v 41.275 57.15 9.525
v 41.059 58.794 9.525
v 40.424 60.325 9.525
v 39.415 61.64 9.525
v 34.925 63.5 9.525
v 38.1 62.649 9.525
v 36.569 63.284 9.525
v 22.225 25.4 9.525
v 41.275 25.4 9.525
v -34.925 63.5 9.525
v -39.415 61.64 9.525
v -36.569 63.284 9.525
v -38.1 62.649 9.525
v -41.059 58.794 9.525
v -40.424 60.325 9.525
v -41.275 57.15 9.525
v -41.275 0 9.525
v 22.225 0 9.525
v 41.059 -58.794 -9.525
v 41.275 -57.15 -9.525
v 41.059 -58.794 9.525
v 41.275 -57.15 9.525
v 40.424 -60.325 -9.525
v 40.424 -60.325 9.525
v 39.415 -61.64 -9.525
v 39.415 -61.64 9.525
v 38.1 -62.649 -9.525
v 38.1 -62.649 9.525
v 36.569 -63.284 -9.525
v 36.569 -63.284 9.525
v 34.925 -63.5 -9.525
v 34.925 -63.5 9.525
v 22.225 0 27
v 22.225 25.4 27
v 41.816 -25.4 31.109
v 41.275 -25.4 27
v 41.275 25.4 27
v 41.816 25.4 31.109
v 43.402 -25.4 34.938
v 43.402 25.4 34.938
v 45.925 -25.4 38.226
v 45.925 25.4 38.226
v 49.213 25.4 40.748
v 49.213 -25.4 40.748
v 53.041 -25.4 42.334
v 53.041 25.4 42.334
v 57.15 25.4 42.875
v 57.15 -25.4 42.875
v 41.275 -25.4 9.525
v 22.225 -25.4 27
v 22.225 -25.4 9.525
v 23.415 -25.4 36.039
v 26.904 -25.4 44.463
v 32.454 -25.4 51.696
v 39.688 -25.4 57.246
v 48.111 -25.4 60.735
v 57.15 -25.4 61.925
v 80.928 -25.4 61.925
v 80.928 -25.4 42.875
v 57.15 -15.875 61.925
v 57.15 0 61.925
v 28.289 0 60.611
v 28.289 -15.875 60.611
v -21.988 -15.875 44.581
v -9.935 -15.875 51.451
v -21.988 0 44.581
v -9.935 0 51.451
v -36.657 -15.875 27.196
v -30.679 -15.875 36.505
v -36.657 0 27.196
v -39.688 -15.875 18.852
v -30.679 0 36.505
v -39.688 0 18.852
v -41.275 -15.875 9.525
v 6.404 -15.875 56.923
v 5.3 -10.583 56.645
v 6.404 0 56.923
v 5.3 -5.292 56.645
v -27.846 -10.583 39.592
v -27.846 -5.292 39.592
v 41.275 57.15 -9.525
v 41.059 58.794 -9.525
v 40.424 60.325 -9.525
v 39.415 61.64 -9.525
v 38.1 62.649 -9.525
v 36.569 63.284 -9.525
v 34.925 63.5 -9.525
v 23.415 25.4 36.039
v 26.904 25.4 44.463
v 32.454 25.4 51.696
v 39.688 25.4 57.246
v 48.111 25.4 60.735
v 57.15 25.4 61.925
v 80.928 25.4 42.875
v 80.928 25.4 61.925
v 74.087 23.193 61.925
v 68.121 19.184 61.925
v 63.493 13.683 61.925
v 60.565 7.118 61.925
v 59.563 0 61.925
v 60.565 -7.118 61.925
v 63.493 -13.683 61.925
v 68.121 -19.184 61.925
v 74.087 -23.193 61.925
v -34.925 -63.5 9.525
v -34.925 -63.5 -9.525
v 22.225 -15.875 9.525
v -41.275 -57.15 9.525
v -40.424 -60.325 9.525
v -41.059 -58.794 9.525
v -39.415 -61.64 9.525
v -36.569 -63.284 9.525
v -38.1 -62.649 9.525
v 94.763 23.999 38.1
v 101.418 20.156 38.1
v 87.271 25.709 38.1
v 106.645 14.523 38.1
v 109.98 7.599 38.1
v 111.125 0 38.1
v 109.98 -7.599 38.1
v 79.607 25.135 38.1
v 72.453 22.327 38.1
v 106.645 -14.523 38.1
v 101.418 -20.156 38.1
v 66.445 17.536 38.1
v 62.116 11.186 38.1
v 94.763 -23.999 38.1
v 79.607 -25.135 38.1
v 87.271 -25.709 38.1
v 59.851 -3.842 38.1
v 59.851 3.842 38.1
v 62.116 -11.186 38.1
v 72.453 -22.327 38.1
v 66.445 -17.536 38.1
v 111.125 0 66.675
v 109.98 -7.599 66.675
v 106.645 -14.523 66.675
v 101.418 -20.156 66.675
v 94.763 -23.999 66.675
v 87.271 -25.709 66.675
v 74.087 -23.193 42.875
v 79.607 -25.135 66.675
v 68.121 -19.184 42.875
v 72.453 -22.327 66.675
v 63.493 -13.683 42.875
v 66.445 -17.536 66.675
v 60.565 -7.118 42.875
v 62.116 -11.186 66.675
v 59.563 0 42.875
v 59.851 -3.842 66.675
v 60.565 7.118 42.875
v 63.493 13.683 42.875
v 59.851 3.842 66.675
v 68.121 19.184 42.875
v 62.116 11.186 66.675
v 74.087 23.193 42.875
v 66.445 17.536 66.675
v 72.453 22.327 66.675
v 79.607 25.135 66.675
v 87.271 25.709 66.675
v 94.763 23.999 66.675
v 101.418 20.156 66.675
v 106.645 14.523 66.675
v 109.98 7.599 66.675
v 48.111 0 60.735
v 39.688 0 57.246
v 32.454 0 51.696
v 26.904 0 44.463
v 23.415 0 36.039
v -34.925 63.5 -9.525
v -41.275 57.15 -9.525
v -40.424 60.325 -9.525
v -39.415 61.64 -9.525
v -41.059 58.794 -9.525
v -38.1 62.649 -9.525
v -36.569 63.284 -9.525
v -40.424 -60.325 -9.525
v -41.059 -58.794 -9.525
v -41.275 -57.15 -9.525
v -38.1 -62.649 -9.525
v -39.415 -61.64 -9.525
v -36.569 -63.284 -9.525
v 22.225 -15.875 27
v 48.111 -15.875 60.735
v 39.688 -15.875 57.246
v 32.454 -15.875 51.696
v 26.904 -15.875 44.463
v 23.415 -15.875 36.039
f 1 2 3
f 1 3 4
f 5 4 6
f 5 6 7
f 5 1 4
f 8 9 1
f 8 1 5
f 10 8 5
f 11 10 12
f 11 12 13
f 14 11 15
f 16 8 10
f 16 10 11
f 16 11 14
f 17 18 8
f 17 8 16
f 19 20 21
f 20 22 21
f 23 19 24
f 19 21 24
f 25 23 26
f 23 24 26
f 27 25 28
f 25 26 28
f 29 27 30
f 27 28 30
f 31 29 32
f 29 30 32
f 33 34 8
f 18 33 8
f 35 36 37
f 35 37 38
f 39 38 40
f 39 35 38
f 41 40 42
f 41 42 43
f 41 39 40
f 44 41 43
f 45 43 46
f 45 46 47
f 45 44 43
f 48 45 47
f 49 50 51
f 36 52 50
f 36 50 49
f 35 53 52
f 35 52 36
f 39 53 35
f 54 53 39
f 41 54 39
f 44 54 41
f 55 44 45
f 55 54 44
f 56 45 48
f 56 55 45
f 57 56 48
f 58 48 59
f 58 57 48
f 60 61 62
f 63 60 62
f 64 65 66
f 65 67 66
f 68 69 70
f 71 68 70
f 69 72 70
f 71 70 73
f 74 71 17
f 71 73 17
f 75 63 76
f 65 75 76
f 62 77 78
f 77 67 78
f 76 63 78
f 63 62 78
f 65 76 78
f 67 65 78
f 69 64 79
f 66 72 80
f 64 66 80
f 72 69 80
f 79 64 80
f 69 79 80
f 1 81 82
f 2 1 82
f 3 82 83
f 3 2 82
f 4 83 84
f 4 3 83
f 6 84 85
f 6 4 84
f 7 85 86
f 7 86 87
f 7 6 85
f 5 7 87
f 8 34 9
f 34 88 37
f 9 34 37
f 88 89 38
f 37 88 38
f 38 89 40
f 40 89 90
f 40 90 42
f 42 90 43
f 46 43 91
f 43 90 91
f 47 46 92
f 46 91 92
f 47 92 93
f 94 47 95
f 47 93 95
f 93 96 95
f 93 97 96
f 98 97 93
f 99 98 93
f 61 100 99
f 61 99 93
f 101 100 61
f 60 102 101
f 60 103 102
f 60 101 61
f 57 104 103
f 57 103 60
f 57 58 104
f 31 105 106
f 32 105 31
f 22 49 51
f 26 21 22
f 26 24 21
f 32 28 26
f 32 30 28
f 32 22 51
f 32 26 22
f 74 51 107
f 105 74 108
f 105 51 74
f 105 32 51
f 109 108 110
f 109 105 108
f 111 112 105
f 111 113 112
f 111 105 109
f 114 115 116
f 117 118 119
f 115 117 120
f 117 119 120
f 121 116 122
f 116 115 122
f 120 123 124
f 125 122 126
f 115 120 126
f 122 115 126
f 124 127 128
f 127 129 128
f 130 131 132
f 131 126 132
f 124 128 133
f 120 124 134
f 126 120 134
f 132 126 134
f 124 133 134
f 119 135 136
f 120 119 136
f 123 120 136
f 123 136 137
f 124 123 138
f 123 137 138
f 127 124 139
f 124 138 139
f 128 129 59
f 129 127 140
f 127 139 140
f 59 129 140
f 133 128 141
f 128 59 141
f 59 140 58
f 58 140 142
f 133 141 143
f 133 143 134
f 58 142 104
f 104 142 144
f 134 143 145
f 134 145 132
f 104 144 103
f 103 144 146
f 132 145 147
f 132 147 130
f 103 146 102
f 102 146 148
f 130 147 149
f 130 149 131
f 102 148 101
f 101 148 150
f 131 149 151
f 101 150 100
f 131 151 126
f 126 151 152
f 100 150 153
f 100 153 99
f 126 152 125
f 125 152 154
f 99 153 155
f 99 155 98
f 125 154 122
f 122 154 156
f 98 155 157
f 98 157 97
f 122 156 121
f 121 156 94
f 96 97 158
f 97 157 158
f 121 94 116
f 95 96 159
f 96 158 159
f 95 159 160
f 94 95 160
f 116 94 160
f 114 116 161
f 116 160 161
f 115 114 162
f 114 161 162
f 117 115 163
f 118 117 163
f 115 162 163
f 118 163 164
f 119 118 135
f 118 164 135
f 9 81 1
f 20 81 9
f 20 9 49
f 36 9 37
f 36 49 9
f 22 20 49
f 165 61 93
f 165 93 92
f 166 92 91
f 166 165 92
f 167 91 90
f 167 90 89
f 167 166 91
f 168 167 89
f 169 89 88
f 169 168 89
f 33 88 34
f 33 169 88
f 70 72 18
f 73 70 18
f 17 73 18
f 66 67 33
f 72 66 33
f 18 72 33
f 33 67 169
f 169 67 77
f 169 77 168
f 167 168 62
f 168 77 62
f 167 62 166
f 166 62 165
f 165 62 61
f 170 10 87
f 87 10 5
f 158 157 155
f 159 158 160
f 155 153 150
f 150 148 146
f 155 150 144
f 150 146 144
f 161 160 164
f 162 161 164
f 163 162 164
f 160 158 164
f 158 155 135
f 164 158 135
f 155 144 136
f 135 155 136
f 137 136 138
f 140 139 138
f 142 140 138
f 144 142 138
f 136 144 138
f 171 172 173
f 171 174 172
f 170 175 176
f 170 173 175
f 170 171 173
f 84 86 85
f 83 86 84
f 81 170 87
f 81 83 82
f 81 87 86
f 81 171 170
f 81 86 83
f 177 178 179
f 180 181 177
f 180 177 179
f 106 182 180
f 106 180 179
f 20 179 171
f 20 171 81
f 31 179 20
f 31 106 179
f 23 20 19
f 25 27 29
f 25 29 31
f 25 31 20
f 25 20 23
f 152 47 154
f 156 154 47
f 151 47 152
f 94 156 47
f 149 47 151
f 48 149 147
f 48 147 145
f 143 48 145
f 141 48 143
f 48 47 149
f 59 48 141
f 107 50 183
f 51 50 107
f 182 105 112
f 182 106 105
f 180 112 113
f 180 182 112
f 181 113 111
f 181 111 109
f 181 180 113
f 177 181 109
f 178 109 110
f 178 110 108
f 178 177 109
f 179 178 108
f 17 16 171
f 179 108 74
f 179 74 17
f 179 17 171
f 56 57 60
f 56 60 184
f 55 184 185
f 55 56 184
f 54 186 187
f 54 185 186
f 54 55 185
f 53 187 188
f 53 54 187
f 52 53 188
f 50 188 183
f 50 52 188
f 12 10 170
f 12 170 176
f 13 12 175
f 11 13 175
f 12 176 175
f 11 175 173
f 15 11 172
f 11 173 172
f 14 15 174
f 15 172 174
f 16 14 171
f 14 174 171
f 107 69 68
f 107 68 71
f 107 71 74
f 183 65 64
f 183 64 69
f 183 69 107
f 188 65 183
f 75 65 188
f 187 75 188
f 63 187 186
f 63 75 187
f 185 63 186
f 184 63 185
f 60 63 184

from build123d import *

# Parameters (mm, degrees)
F1_DEPTH = 63.5
F0_W     = 25.0189637039
F0_H     = 19.05
F2_DEPTH = 25.4
F3_DEPTH = 15.875
F5_R     = 6.35


with BuildPart() as f1:
    # F0 (on Front) → F1 (new body, symmetric)
    with BuildSketch(Plane.XZ):
        Polygon((22.225, 9.525), (-41.275, 9.525), (-41.275, -9.525), (41.275, -9.525), (41.275, 9.525), align=None)
    extrude(amount=F1_DEPTH, both=True)

    # F0 (on Front) → F2 (join, symmetric)
    with BuildSketch(Plane.XZ):
        with BuildLine():
            Line((22.225, 27.0002), (22.225, 9.525))
            Line((22.225, 9.525), (41.275, 9.525))
            Line((41.275, 9.525), (41.275, 27.0002))
            ThreePointArc((41.275, 27.0002), (45.9246798487, 38.2255201513), (57.15, 42.8752))
            Line((57.15, 42.8752), (60.325, 42.8752))
            Line((60.325, 42.8752), (60.325, 61.9252))
            Line((60.325, 61.9252), (57.15, 61.9252))
            ThreePointArc((57.15, 61.9252), (32.4542956671, 51.6959043329), (22.225, 27.0002))
        make_face()
        with Locations((72.8344818519, 52.4002)):
            Rectangle(F0_W, F0_H)
    extrude(amount=F2_DEPTH, both=True)

    # F0 (on Front) → F3 (join)
    with BuildSketch(Plane.XZ):
        with BuildLine():
            add(Edge.make_bspline(
                [(57.15, 61.9252), (-3.7140410859, 62.1167458594), (-38.0423441529, 46.5129725635), (-41.275, 9.525)],
                knots=[0, 0, 0, 0, 111.5045361635, 111.5045361635, 111.5045361635, 111.5045361635], degree=3))
            Line((-41.275, 9.525), (22.225, 9.525))
            Line((22.225, 9.525), (22.225, 27.0002))
            ThreePointArc((22.225, 27.0002), (32.4542956671, 51.6959043329), (57.15, 61.9252))
        make_face()
    extrude(amount=F3_DEPTH)

    # F0 (on Front) → F4 (revolve)
    with BuildSketch(Plane.XZ):
        Polygon((85.3439637039, 66.675), (85.3439637039, 61.9252), (85.3439637039, 42.8752), (85.3439637039, 38.1), (111.125, 38.1), (111.125, 66.675), align=None)
    revolve(axis=Axis((85.3439637039, 0, 52.3875), (0, 0, -1)))

    # F5
    f5_edges = [f1.edges().sort_by_distance(p)[0] for p in [
        (-41.275, 63.5, 0),
        (41.275, 63.5, 0),
        (41.275, -63.5, 0),
        (-41.275, -63.5, 0),
    ]]
    fillet(f5_edges, radius=F5_R)


solid = f1.part
